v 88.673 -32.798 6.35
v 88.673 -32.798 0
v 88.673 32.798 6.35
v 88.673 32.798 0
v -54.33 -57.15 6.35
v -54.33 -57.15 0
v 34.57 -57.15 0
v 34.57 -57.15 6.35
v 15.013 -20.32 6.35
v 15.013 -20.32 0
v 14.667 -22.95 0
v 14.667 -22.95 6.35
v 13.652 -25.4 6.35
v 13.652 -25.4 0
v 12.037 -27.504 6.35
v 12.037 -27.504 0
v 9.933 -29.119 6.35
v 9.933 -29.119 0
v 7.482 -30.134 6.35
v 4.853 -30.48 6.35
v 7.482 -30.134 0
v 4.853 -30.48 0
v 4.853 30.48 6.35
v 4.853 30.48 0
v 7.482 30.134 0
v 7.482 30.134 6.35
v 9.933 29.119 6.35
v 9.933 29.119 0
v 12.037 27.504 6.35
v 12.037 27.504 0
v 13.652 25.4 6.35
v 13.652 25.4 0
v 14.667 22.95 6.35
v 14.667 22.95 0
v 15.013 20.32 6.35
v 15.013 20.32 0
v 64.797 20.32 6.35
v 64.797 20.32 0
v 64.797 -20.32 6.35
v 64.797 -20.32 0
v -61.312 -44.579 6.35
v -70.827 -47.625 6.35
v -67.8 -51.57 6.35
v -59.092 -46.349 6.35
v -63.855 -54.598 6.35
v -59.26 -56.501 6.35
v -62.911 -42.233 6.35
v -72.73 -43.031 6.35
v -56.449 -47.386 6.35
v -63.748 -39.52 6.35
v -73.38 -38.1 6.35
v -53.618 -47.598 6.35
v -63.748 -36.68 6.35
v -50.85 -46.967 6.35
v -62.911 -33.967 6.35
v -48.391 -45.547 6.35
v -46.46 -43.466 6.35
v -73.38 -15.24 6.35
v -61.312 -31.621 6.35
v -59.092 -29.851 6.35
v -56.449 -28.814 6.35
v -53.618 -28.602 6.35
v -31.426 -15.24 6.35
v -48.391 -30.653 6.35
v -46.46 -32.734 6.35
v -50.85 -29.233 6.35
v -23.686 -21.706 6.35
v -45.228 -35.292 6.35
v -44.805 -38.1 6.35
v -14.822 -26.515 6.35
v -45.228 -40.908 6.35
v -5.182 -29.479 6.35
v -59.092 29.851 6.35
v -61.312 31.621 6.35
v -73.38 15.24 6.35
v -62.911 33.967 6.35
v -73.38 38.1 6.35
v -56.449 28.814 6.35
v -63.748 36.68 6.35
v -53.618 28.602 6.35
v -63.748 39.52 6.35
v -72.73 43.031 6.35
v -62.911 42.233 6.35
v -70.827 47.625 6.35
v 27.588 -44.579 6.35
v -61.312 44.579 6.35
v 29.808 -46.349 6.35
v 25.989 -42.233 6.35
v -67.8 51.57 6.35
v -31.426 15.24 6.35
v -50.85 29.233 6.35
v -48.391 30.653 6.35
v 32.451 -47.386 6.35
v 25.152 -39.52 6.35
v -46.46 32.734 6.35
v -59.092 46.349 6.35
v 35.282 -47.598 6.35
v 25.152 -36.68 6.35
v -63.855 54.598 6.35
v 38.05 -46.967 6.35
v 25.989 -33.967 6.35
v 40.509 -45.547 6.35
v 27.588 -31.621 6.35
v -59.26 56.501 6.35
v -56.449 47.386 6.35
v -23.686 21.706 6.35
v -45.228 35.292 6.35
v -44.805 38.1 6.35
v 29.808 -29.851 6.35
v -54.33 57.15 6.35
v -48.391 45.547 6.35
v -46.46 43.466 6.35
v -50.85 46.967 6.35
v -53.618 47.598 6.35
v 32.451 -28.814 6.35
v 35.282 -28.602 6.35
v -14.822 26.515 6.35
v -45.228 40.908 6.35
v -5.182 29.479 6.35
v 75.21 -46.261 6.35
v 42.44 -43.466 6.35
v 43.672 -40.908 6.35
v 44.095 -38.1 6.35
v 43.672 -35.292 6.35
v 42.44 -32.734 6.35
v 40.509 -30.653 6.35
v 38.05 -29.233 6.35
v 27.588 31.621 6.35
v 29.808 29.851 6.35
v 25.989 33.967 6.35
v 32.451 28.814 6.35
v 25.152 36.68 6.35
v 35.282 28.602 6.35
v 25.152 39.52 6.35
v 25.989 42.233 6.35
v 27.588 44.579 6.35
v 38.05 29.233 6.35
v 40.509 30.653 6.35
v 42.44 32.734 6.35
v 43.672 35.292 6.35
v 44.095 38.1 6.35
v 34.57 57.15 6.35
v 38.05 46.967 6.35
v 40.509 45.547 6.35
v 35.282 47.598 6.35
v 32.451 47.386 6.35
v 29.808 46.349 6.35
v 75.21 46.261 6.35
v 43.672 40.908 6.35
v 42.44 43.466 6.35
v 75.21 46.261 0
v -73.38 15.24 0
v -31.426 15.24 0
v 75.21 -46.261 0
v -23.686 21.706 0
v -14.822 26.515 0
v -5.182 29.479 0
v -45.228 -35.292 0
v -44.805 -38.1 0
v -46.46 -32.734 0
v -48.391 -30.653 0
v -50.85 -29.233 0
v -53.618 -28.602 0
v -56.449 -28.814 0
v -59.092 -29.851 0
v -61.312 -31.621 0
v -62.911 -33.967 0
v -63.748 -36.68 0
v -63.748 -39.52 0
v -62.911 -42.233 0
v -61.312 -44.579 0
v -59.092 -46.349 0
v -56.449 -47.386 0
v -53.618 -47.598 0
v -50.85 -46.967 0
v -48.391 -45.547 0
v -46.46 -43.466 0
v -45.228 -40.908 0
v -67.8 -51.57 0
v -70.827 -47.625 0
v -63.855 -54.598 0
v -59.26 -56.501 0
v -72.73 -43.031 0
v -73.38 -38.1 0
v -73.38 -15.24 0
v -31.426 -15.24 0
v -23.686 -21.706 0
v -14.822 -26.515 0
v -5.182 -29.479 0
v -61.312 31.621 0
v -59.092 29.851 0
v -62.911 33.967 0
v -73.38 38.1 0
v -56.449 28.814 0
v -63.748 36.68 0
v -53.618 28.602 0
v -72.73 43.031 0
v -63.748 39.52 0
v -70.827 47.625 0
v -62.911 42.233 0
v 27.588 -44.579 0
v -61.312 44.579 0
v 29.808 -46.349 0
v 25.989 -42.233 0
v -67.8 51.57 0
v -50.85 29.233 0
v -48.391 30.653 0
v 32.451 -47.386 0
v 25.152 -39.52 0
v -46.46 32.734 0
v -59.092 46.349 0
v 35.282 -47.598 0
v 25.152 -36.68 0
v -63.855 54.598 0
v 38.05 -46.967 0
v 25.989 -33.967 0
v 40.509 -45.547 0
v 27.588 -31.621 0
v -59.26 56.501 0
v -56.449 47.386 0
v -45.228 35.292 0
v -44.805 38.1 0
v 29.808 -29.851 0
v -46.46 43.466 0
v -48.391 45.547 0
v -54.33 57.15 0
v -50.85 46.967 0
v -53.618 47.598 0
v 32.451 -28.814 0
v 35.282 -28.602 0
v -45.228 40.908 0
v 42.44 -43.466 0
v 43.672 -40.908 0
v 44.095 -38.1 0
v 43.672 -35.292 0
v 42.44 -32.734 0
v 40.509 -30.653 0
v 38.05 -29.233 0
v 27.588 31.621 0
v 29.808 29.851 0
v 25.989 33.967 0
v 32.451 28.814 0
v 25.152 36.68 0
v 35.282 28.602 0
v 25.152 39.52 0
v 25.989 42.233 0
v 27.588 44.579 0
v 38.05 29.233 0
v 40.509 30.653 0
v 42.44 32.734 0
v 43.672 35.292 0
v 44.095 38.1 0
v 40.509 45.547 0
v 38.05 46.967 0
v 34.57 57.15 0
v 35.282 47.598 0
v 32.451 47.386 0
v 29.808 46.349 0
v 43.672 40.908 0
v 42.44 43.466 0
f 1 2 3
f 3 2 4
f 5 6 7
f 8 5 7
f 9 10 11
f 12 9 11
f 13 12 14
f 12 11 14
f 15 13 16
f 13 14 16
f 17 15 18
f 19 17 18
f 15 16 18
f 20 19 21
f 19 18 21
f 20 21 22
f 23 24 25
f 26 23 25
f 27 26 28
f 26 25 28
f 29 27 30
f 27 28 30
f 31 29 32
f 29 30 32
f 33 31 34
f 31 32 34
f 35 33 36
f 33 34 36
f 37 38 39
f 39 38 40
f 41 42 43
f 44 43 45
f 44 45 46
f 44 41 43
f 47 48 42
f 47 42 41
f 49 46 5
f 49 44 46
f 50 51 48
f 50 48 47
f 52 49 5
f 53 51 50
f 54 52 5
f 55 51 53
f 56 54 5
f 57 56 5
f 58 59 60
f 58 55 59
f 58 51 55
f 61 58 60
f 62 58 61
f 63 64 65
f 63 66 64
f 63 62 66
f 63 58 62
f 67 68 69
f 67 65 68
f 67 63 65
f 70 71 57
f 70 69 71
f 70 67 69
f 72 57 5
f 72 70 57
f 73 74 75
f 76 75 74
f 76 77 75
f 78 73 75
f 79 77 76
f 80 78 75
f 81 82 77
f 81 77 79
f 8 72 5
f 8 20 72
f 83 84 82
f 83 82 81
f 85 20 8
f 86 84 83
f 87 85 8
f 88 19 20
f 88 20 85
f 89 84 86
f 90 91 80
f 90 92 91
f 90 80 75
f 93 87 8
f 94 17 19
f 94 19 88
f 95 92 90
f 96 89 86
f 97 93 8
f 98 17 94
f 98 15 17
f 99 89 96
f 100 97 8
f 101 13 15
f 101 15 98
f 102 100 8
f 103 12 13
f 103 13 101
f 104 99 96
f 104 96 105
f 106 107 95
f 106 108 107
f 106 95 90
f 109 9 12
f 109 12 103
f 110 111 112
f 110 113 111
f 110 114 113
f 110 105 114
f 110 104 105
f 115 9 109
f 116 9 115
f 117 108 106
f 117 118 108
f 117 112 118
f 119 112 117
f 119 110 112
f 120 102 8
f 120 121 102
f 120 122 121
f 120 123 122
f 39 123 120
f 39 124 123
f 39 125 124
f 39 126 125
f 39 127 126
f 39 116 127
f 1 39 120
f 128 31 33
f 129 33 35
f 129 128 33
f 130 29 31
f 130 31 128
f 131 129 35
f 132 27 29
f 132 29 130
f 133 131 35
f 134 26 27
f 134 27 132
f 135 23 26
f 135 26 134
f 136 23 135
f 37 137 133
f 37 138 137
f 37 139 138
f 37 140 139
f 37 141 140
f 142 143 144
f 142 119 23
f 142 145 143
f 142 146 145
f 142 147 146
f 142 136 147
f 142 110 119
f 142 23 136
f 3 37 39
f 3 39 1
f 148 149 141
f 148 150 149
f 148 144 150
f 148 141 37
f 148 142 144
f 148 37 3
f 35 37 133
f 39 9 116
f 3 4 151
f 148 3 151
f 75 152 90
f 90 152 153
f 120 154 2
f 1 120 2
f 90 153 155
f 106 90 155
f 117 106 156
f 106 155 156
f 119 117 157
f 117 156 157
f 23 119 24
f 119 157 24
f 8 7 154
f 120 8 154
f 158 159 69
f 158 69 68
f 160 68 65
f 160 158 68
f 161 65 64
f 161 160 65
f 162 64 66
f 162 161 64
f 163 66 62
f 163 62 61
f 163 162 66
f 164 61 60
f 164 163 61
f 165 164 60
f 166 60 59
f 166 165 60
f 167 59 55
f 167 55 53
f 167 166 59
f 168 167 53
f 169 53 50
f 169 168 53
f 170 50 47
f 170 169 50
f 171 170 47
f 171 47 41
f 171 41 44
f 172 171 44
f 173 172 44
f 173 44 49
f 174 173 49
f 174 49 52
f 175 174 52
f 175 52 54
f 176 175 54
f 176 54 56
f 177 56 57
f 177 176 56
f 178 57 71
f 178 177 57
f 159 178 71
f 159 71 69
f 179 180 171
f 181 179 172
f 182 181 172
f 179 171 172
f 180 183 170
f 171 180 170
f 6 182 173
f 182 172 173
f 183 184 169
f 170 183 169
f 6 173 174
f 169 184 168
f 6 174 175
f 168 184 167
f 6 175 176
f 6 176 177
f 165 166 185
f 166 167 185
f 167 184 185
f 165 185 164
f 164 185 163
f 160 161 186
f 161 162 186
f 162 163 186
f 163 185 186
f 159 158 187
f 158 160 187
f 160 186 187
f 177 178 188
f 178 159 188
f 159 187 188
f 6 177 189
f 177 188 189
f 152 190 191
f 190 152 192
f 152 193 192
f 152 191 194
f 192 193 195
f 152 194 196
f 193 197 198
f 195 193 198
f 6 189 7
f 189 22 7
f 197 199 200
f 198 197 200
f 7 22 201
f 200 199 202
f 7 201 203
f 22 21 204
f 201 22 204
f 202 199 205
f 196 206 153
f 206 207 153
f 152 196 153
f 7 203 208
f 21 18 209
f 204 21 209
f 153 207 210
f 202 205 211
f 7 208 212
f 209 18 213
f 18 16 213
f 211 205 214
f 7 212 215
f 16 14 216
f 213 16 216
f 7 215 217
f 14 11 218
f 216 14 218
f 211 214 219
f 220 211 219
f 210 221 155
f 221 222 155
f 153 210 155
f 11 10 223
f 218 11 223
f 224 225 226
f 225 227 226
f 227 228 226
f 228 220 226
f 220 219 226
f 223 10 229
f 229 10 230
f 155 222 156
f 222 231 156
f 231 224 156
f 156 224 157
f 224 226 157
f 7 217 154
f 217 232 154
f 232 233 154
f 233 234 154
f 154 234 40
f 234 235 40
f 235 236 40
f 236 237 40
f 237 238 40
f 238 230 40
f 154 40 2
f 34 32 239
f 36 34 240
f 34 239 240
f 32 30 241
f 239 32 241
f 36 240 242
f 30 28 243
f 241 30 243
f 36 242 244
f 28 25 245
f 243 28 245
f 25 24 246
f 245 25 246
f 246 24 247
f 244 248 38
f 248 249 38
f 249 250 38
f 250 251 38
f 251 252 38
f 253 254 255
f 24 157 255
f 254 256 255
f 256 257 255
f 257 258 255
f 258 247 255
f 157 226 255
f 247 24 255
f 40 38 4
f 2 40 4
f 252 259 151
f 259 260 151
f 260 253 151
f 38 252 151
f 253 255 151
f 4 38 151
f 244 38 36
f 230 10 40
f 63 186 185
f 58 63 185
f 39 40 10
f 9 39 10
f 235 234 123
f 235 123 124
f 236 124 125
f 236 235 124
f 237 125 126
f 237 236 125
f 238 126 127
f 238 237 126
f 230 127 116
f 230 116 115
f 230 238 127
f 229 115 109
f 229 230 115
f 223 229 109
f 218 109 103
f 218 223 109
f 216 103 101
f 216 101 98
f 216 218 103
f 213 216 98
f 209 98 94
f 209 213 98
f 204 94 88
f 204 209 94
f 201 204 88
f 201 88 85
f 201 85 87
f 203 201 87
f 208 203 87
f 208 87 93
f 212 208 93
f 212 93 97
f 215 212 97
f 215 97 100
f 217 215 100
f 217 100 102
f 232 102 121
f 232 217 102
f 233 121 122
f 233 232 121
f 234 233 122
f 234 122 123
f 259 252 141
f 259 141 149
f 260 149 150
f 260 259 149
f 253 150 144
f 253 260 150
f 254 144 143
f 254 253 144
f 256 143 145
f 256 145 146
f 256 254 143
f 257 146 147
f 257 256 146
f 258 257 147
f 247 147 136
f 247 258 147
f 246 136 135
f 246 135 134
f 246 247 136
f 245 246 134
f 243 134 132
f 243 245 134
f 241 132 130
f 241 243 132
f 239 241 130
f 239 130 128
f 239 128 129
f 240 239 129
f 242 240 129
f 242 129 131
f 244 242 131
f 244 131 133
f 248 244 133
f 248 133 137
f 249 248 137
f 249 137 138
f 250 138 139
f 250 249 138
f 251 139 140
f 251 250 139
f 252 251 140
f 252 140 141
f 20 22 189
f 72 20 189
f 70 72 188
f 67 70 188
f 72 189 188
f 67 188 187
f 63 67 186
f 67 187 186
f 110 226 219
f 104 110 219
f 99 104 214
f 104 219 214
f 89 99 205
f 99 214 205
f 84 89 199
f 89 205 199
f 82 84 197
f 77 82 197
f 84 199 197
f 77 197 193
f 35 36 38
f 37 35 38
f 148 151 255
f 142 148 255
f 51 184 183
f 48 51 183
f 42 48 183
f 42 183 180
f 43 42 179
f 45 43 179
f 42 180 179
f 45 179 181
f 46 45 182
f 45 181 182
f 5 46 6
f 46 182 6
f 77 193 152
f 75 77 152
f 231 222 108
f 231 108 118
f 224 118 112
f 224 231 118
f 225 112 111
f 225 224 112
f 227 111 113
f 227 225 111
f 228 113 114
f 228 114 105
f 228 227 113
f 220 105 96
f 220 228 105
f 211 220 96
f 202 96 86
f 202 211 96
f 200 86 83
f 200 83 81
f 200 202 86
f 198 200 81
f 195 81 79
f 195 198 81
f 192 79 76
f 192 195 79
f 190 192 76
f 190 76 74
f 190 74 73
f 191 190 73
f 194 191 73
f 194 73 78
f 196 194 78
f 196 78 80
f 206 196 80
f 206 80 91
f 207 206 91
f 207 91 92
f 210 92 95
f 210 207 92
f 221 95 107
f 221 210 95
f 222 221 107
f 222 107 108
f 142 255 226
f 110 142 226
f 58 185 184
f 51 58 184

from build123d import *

# Parameters (mm, degrees)
F0_R     = 9.525
F1_DEPTH = 6.35


with BuildPart() as f1:
    # F0 (on Top) → F1 (new body)
    with BuildSketch(Plane.XY):
        with BuildLine():
            Line((34.570389, 57.15), (-54.329611, 57.15))
            ThreePointArc((-54.329611, 57.15), (-67.799996, 51.570384), (-73.379611, 38.1))
            Line((-73.379611, 38.1), (-73.379611, 15.24))
            Line((-73.379611, 15.24), (-31.425689, 15.24))
            ThreePointArc((-31.425689, 15.24), (-14.821988, 26.515286), (4.852767, 30.48))
            ThreePointArc((4.852767, 30.48), (12.036972, 27.504205), (15.012767, 20.32))
            Line((15.012767, 20.32), (64.796767, 20.32))
            Line((64.796767, 20.32), (64.796767, 0))
            Line((64.796767, 0), (64.796767, -20.32))
            Line((64.796767, -20.32), (15.012767, -20.32))
            ThreePointArc((15.012767, -20.32), (12.036972, -27.504205), (4.852767, -30.48))
            ThreePointArc((4.852767, -30.48), (-14.821988, -26.515286), (-31.425689, -15.24))
            Line((-31.425689, -15.24), (-73.379611, -15.24))
            Line((-73.379611, -15.24), (-73.379611, -38.1))
            ThreePointArc((-73.379611, -38.1), (-67.799996, -51.570384), (-54.329611, -57.15))
            Line((-54.329611, -57.15), (34.570389, -57.15))
            Line((34.570389, -57.15), (75.210389, -46.260545))
            Line((75.210389, -46.260545), (88.672767, -32.798166))
            Line((88.672767, -32.798166), (88.672767, 0))
            Line((88.672767, 0), (88.672767, 32.798166))
            Line((88.672767, 32.798166), (75.210389, 46.260545))
            Line((75.210389, 46.260545), (34.570389, 57.15))
        make_face()
        with Locations((-54.329611, -38.1)):
            Circle(F0_R, mode=Mode.SUBTRACT)
        with Locations((34.570389, -38.1)):
            Circle(F0_R, mode=Mode.SUBTRACT)
        with Locations((-54.329611, 38.1)):
            Circle(F0_R, mode=Mode.SUBTRACT)
        with Locations((34.570389, 38.1)):
            Circle(F0_R, mode=Mode.SUBTRACT)
    extrude(amount=F1_DEPTH)


solid = f1.part
